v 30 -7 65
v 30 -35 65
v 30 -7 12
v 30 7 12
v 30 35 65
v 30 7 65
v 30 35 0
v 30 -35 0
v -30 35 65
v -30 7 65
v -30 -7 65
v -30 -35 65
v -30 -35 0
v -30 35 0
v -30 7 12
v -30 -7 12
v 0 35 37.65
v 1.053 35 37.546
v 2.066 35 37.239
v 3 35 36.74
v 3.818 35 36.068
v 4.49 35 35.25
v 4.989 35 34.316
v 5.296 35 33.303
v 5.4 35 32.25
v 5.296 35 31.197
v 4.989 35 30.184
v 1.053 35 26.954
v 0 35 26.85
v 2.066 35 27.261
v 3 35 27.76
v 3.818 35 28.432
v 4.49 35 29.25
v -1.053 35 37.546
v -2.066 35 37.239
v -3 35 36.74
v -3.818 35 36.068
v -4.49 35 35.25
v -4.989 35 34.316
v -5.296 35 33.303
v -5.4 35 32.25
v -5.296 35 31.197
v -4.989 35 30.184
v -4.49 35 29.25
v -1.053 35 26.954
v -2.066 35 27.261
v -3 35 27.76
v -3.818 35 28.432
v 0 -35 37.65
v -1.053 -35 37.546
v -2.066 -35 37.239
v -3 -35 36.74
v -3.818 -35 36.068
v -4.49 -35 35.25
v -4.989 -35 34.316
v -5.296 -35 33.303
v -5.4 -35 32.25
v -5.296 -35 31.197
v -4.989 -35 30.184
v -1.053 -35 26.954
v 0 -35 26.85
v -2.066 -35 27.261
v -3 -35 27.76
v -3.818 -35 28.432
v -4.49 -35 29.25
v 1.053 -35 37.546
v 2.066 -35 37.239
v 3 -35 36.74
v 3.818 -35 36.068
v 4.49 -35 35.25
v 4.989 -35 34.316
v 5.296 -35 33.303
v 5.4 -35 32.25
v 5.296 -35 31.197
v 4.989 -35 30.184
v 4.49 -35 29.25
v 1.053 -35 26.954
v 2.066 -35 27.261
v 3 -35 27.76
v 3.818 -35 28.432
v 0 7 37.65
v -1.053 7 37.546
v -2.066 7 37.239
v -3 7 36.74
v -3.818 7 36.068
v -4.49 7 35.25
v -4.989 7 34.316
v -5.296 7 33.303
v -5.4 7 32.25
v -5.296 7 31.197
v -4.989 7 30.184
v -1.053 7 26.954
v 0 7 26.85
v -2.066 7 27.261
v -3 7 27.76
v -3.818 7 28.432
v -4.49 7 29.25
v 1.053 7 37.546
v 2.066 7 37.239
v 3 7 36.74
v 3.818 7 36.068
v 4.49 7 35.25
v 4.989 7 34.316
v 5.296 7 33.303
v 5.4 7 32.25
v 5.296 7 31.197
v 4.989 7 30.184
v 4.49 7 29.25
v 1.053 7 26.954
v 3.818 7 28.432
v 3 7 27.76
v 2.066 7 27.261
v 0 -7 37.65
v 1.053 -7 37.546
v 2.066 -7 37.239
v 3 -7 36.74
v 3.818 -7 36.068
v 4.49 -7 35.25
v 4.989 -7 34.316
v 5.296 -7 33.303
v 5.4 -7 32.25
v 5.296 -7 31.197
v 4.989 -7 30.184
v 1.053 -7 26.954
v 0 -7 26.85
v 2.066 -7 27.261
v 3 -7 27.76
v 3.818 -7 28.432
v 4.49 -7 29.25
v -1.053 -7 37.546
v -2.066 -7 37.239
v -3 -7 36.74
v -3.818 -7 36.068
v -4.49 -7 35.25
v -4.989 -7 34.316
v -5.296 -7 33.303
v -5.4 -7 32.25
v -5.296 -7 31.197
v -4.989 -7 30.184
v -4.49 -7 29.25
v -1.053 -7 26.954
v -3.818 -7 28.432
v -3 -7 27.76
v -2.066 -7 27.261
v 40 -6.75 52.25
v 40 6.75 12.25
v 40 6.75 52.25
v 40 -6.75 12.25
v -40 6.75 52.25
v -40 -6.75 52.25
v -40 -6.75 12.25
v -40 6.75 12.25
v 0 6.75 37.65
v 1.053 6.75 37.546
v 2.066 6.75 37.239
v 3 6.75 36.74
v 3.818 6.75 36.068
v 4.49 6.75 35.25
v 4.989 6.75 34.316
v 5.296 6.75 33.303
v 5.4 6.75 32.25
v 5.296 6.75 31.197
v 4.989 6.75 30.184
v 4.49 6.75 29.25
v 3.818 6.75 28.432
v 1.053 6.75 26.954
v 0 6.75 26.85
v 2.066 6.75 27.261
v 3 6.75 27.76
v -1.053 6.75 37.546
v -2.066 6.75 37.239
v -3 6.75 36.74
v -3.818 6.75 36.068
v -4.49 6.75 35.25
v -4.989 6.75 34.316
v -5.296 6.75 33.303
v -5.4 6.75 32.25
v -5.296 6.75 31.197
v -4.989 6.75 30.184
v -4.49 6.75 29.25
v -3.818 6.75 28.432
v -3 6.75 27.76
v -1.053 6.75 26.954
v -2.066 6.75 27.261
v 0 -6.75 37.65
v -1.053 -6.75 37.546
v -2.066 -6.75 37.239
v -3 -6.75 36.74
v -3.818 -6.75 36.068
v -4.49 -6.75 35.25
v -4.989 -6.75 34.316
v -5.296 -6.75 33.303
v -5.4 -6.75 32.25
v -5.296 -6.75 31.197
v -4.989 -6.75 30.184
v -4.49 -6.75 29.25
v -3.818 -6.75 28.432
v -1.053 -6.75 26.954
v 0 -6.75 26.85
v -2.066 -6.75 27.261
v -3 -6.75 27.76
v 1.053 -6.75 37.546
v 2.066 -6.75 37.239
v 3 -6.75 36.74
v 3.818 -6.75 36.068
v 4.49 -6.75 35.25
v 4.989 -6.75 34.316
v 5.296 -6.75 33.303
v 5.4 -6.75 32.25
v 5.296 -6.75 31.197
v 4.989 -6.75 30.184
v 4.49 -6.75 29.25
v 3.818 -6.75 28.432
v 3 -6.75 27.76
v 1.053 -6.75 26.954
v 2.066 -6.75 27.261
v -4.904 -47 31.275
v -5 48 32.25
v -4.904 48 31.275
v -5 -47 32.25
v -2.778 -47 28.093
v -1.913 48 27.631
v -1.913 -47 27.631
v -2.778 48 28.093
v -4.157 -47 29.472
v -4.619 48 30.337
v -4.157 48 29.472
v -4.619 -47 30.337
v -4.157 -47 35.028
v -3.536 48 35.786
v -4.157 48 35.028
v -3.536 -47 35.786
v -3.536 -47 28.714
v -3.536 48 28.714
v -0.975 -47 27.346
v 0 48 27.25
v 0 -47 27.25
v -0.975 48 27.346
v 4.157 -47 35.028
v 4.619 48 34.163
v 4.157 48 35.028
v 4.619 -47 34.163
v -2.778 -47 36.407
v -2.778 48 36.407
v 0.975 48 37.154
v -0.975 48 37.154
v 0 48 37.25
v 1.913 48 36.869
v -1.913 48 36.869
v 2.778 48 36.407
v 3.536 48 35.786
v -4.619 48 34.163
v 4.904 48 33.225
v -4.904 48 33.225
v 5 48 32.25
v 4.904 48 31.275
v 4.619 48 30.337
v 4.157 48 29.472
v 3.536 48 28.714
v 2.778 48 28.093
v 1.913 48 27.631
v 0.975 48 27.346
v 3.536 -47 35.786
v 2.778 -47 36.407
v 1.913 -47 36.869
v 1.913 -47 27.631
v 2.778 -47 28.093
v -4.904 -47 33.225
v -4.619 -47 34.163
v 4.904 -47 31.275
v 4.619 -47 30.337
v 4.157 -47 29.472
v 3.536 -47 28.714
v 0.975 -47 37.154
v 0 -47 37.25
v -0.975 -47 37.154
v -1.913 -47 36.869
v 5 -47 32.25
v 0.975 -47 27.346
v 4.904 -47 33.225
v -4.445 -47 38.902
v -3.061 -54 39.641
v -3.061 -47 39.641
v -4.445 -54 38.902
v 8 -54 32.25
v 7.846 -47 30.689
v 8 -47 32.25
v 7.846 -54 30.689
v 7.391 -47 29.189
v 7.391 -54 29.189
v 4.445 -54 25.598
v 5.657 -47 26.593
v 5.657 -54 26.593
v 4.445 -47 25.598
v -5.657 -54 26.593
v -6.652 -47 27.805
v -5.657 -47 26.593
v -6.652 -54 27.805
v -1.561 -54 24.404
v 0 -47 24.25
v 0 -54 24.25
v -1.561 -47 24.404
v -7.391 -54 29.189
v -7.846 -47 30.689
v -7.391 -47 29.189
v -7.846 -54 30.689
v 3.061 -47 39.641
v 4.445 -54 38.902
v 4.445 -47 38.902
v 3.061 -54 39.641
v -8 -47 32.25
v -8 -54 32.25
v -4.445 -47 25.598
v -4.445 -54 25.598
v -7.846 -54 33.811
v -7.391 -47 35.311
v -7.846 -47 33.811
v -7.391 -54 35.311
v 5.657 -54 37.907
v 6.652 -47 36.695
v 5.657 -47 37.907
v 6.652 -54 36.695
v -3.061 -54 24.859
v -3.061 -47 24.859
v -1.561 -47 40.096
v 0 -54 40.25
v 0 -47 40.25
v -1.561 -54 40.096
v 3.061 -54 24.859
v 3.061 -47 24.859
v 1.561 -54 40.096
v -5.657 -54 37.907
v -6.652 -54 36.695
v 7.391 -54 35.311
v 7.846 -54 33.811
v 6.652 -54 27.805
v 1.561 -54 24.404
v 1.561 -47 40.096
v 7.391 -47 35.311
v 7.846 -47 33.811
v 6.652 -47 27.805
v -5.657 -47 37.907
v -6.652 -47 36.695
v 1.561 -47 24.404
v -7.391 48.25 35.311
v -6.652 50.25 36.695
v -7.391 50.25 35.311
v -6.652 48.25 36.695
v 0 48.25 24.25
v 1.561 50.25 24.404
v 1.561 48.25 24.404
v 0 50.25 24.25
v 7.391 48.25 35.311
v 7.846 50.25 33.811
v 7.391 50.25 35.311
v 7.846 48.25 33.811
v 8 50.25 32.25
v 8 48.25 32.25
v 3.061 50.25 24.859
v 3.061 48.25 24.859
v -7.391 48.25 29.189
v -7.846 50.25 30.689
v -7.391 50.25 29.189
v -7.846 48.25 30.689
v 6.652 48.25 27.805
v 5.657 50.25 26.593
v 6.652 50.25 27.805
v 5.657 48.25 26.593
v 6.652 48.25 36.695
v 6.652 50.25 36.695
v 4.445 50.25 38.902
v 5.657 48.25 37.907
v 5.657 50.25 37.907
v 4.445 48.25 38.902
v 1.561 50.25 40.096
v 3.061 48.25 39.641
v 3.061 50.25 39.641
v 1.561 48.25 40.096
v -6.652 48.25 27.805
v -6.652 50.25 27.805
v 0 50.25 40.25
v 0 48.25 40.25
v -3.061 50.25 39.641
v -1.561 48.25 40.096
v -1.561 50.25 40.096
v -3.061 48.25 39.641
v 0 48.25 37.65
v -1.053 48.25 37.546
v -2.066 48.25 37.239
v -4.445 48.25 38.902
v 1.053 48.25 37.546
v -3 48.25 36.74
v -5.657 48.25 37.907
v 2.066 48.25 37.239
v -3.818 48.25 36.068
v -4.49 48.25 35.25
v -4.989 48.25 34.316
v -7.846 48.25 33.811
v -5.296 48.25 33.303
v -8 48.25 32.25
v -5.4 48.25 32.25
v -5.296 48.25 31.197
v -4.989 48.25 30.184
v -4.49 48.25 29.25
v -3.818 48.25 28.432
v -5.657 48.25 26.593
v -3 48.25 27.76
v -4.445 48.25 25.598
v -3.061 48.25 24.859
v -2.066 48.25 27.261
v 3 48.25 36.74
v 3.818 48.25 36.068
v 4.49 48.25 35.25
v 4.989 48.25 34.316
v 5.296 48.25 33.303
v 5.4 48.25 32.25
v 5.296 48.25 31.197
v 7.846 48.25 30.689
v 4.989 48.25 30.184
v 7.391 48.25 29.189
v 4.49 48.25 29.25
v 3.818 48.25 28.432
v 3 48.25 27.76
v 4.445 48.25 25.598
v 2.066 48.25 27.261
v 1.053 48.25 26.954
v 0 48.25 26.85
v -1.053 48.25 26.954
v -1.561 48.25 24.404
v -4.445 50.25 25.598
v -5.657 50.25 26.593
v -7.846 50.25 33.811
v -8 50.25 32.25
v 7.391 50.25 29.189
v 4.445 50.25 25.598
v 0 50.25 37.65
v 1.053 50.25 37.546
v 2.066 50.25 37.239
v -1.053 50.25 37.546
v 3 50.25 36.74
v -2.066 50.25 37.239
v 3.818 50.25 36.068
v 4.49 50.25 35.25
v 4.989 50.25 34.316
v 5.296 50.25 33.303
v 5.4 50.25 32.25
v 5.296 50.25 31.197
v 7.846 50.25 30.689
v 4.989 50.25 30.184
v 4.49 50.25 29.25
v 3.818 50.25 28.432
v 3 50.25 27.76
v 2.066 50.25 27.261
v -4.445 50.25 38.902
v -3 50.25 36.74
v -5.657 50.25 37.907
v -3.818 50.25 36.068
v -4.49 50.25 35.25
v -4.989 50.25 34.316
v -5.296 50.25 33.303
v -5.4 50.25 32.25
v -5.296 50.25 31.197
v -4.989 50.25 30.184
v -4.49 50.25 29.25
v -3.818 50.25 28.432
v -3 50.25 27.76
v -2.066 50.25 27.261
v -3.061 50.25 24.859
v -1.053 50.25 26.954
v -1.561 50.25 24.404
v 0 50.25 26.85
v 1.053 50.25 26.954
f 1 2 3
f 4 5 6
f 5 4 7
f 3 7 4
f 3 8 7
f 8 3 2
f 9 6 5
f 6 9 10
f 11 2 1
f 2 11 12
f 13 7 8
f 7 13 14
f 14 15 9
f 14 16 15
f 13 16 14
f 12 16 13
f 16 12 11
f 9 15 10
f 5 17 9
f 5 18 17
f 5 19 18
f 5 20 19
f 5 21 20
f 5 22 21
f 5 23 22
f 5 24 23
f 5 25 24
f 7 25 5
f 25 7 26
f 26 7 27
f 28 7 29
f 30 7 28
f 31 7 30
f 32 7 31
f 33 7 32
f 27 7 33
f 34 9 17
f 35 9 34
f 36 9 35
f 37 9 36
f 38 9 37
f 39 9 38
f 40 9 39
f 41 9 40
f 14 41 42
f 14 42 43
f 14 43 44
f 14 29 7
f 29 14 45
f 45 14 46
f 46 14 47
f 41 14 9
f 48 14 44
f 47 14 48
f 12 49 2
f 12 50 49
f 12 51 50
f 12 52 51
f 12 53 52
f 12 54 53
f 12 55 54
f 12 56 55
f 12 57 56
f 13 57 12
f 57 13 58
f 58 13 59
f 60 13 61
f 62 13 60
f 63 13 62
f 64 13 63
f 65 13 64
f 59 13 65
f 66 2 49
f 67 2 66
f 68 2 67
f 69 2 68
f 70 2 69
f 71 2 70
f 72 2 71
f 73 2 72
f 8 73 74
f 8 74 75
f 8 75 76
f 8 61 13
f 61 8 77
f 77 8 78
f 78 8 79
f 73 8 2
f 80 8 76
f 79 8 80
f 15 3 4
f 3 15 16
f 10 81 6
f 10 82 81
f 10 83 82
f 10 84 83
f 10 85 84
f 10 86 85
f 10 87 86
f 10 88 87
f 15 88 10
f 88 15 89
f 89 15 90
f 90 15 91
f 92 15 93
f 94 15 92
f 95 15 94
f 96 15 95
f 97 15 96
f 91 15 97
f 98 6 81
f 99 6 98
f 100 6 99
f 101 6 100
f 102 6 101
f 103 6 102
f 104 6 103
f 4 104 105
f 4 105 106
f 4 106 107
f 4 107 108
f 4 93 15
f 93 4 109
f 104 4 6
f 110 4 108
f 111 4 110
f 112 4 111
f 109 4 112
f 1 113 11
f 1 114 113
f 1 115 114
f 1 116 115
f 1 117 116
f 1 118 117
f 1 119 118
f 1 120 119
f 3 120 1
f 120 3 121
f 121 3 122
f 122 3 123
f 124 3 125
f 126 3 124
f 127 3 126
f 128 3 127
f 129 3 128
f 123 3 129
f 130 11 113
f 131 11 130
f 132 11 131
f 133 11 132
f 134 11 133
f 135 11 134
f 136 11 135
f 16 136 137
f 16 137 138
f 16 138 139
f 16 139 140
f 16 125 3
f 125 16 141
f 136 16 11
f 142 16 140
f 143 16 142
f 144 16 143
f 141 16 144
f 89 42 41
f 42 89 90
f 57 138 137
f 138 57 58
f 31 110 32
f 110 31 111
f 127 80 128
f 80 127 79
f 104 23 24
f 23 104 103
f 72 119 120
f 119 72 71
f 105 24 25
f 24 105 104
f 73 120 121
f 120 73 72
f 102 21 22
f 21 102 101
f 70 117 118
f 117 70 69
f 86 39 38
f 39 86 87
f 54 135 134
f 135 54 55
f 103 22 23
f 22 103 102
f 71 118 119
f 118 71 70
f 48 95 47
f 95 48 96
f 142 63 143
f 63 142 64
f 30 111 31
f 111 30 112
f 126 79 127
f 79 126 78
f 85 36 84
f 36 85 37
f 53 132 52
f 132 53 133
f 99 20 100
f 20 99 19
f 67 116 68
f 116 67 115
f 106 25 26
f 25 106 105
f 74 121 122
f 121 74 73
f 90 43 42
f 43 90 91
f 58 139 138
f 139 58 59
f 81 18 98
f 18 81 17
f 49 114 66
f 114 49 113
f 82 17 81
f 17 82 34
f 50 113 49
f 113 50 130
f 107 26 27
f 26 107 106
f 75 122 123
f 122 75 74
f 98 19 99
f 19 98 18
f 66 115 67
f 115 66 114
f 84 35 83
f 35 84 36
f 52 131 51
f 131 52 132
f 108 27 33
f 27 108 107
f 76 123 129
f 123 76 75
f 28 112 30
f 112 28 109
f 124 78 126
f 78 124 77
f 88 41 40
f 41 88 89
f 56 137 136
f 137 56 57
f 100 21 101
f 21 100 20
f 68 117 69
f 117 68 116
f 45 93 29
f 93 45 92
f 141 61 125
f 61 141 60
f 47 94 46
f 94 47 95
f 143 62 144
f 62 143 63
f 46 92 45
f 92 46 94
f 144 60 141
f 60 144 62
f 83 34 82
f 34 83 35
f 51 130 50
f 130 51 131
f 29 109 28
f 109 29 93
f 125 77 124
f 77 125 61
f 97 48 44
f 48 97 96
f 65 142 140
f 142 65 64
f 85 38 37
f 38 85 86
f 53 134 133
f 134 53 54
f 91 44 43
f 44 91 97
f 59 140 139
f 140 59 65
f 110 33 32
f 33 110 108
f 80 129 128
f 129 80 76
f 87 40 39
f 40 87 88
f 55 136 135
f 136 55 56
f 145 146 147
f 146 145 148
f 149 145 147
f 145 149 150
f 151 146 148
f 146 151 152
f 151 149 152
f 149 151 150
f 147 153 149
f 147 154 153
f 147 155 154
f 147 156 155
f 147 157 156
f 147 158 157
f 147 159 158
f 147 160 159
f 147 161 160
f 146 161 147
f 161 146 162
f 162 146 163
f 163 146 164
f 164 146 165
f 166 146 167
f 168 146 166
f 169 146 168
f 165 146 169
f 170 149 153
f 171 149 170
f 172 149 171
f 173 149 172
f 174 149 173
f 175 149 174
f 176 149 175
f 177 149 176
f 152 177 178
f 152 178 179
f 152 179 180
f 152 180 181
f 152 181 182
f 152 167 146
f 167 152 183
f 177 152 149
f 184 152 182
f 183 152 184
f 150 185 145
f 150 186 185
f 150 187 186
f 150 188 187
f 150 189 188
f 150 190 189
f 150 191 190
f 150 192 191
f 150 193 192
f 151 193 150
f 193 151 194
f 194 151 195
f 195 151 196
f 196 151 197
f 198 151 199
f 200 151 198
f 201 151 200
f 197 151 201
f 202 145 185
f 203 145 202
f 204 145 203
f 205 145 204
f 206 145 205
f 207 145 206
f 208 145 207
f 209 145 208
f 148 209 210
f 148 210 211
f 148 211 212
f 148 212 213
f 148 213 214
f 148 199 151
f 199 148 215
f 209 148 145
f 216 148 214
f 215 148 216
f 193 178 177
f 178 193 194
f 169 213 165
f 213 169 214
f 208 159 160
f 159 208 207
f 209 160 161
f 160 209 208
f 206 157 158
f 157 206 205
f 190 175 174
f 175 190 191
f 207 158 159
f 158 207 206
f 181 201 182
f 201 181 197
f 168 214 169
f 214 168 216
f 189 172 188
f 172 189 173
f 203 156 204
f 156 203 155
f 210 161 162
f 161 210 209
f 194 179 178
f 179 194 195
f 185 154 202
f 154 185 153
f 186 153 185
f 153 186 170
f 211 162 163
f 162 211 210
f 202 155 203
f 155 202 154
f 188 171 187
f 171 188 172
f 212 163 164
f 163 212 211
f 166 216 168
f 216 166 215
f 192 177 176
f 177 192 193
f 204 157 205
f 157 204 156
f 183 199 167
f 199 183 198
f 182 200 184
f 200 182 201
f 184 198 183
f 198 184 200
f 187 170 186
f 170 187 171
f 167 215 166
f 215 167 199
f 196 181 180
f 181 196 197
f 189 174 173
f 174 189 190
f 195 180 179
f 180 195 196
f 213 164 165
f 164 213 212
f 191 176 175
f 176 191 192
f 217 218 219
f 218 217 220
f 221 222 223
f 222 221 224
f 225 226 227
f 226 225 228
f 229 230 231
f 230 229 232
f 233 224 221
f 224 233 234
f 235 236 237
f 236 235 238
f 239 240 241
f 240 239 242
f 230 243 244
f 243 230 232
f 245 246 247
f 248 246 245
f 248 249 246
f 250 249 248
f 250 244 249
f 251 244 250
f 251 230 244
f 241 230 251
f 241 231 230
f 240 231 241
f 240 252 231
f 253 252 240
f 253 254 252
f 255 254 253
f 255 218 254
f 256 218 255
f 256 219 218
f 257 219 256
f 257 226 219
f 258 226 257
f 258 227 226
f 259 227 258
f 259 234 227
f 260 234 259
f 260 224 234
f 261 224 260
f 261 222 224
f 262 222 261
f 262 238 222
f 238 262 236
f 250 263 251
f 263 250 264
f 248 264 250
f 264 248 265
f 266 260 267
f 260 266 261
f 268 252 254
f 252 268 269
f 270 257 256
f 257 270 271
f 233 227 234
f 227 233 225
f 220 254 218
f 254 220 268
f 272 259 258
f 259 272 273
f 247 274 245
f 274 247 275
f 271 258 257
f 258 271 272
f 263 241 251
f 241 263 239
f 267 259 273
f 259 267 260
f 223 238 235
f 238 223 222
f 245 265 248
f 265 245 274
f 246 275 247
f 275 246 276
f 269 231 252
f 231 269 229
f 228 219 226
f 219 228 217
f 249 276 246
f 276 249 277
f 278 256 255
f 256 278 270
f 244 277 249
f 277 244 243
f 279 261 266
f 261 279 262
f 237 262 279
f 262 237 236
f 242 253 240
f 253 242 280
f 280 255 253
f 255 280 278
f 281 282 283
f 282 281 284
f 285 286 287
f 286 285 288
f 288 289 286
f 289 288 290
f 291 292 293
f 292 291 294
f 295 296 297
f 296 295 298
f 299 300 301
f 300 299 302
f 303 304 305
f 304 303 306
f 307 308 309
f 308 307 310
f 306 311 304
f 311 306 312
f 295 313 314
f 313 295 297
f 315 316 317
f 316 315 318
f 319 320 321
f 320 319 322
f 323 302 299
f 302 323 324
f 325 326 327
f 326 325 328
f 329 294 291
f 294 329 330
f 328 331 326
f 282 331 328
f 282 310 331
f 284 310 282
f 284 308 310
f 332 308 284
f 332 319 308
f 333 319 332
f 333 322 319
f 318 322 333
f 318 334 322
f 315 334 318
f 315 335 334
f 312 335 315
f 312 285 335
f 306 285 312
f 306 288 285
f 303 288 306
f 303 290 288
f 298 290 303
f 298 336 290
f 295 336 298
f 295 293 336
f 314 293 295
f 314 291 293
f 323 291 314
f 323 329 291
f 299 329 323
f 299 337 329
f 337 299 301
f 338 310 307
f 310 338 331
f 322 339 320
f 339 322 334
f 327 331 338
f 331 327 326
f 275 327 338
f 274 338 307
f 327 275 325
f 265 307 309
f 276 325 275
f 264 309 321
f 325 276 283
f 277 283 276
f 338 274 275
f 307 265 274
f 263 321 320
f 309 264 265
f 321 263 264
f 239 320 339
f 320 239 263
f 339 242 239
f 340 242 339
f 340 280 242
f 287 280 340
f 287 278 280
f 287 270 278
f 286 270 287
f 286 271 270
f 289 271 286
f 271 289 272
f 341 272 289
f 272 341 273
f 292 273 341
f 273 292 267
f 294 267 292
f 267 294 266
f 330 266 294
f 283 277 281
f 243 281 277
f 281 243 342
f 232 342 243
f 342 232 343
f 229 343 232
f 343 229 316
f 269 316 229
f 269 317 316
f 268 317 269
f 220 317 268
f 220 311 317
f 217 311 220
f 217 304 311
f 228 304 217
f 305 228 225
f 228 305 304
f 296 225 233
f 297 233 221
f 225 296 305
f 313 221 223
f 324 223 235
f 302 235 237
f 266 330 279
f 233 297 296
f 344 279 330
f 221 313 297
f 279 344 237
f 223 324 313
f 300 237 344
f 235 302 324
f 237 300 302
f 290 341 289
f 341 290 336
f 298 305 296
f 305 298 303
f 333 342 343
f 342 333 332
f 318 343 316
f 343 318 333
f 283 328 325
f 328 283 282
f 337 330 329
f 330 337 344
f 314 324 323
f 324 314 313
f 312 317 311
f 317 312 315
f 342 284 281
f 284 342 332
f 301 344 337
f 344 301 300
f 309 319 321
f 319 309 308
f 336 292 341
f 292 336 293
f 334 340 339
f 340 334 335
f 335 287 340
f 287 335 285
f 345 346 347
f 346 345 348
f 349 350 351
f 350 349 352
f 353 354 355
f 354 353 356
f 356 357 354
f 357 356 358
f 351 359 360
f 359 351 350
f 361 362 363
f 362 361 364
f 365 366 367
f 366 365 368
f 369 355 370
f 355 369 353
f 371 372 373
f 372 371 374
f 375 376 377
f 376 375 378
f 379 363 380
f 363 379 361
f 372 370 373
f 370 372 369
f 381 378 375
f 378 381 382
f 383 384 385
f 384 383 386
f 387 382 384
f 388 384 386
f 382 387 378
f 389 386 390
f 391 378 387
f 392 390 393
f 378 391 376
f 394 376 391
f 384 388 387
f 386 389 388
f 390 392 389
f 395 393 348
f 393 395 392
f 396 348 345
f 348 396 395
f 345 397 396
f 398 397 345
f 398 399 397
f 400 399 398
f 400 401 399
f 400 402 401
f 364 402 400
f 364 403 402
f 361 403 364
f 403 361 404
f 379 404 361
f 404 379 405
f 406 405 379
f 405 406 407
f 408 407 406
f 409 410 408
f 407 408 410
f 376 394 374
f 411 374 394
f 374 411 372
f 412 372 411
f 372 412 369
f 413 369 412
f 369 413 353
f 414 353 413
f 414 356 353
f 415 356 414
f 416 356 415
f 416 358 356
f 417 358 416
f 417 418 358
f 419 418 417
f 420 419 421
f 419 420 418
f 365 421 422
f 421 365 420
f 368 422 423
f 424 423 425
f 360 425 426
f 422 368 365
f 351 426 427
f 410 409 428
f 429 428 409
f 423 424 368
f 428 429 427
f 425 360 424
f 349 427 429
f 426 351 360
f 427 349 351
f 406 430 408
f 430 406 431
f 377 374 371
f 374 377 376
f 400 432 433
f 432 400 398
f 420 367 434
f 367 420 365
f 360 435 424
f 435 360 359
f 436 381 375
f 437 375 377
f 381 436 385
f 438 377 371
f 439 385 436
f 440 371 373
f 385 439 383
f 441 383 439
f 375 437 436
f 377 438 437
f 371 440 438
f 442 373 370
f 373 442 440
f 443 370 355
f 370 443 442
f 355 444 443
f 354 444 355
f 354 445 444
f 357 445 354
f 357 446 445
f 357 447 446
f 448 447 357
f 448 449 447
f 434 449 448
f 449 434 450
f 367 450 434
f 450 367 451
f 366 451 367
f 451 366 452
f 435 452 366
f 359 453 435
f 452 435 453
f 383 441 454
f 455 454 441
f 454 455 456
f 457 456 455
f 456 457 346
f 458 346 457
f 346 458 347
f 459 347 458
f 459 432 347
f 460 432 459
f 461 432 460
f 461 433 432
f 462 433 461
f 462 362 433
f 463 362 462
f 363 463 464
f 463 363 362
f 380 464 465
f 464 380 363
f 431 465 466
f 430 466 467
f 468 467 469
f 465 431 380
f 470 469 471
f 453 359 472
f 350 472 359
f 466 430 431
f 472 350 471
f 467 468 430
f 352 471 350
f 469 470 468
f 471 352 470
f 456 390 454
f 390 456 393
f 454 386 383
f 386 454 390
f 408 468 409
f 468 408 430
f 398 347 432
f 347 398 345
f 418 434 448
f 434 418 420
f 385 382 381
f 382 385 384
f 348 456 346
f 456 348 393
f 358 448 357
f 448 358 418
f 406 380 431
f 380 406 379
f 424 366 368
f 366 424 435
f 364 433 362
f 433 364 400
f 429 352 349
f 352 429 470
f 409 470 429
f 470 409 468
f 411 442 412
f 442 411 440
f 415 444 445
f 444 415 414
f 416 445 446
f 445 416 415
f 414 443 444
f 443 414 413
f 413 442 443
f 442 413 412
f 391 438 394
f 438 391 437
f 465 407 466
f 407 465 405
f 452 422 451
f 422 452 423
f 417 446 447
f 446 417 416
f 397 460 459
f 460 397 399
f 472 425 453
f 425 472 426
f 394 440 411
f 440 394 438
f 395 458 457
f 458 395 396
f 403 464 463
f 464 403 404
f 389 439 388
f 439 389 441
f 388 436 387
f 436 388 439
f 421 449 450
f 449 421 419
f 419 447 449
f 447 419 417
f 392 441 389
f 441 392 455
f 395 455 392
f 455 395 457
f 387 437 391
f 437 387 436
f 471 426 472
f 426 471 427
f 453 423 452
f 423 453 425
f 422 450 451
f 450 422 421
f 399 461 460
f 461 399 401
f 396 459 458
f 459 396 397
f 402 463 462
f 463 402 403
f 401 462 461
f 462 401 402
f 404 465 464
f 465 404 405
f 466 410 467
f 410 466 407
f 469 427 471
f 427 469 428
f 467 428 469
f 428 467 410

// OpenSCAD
$fn = 32;

// ------------------------------------------------------------------------
// Clevis joint: 60 mm clevis, pin d10
// Every part is its own module, assembly() places them once.
// ------------------------------------------------------------------------

// --- part 1 ---
module clevis() {
  difference() {
    translate([-30, -35, 0]) cube([60, 70, 65]);
    translate([-31, -7, 12]) cube([62, 14, 54]);
    translate([0, 0, 32.25]) rotate([90, 0, 0]) cylinder(h = 72, d = 10.8, center = true);
  }
}

// --- part 2 ---
module eye() {
  difference() {
    translate([-40, -6.75, 0]) cube([80, 13.5, 40]);
    translate([0, 0, 20]) rotate([90, 0, 0]) cylinder(h = 15.5, d = 10.8, center = true);
  }
}

// --- part 3 ---
module pin() {
  rotate([0, 90, 0]) cylinder(h = 96, d = 10, center = true);
  translate([-54, 0, 0]) rotate([0, 90, 0]) cylinder(h = 7, d = 16);
}

// --- part 4 ---
module retainer() {
  difference() {
      translate([0, 0, 0]) cylinder(h = 2, d = 16);
      translate([0, 0, -1]) cylinder(h = 4, d = 10.8);
    }
}

// --- assembly ---
module assembly() {
  translate([0, 0, 0]) rotate([0, 0, 0]) clevis();
  translate([0, 0, 12.25]) rotate([0, 0, 0]) eye();
  translate([0, 0, 32.25]) rotate([0, 0, 90]) pin();
  translate([0, 50.25, 32.25]) rotate([90, 0, 0]) retainer();
}

assembly();
